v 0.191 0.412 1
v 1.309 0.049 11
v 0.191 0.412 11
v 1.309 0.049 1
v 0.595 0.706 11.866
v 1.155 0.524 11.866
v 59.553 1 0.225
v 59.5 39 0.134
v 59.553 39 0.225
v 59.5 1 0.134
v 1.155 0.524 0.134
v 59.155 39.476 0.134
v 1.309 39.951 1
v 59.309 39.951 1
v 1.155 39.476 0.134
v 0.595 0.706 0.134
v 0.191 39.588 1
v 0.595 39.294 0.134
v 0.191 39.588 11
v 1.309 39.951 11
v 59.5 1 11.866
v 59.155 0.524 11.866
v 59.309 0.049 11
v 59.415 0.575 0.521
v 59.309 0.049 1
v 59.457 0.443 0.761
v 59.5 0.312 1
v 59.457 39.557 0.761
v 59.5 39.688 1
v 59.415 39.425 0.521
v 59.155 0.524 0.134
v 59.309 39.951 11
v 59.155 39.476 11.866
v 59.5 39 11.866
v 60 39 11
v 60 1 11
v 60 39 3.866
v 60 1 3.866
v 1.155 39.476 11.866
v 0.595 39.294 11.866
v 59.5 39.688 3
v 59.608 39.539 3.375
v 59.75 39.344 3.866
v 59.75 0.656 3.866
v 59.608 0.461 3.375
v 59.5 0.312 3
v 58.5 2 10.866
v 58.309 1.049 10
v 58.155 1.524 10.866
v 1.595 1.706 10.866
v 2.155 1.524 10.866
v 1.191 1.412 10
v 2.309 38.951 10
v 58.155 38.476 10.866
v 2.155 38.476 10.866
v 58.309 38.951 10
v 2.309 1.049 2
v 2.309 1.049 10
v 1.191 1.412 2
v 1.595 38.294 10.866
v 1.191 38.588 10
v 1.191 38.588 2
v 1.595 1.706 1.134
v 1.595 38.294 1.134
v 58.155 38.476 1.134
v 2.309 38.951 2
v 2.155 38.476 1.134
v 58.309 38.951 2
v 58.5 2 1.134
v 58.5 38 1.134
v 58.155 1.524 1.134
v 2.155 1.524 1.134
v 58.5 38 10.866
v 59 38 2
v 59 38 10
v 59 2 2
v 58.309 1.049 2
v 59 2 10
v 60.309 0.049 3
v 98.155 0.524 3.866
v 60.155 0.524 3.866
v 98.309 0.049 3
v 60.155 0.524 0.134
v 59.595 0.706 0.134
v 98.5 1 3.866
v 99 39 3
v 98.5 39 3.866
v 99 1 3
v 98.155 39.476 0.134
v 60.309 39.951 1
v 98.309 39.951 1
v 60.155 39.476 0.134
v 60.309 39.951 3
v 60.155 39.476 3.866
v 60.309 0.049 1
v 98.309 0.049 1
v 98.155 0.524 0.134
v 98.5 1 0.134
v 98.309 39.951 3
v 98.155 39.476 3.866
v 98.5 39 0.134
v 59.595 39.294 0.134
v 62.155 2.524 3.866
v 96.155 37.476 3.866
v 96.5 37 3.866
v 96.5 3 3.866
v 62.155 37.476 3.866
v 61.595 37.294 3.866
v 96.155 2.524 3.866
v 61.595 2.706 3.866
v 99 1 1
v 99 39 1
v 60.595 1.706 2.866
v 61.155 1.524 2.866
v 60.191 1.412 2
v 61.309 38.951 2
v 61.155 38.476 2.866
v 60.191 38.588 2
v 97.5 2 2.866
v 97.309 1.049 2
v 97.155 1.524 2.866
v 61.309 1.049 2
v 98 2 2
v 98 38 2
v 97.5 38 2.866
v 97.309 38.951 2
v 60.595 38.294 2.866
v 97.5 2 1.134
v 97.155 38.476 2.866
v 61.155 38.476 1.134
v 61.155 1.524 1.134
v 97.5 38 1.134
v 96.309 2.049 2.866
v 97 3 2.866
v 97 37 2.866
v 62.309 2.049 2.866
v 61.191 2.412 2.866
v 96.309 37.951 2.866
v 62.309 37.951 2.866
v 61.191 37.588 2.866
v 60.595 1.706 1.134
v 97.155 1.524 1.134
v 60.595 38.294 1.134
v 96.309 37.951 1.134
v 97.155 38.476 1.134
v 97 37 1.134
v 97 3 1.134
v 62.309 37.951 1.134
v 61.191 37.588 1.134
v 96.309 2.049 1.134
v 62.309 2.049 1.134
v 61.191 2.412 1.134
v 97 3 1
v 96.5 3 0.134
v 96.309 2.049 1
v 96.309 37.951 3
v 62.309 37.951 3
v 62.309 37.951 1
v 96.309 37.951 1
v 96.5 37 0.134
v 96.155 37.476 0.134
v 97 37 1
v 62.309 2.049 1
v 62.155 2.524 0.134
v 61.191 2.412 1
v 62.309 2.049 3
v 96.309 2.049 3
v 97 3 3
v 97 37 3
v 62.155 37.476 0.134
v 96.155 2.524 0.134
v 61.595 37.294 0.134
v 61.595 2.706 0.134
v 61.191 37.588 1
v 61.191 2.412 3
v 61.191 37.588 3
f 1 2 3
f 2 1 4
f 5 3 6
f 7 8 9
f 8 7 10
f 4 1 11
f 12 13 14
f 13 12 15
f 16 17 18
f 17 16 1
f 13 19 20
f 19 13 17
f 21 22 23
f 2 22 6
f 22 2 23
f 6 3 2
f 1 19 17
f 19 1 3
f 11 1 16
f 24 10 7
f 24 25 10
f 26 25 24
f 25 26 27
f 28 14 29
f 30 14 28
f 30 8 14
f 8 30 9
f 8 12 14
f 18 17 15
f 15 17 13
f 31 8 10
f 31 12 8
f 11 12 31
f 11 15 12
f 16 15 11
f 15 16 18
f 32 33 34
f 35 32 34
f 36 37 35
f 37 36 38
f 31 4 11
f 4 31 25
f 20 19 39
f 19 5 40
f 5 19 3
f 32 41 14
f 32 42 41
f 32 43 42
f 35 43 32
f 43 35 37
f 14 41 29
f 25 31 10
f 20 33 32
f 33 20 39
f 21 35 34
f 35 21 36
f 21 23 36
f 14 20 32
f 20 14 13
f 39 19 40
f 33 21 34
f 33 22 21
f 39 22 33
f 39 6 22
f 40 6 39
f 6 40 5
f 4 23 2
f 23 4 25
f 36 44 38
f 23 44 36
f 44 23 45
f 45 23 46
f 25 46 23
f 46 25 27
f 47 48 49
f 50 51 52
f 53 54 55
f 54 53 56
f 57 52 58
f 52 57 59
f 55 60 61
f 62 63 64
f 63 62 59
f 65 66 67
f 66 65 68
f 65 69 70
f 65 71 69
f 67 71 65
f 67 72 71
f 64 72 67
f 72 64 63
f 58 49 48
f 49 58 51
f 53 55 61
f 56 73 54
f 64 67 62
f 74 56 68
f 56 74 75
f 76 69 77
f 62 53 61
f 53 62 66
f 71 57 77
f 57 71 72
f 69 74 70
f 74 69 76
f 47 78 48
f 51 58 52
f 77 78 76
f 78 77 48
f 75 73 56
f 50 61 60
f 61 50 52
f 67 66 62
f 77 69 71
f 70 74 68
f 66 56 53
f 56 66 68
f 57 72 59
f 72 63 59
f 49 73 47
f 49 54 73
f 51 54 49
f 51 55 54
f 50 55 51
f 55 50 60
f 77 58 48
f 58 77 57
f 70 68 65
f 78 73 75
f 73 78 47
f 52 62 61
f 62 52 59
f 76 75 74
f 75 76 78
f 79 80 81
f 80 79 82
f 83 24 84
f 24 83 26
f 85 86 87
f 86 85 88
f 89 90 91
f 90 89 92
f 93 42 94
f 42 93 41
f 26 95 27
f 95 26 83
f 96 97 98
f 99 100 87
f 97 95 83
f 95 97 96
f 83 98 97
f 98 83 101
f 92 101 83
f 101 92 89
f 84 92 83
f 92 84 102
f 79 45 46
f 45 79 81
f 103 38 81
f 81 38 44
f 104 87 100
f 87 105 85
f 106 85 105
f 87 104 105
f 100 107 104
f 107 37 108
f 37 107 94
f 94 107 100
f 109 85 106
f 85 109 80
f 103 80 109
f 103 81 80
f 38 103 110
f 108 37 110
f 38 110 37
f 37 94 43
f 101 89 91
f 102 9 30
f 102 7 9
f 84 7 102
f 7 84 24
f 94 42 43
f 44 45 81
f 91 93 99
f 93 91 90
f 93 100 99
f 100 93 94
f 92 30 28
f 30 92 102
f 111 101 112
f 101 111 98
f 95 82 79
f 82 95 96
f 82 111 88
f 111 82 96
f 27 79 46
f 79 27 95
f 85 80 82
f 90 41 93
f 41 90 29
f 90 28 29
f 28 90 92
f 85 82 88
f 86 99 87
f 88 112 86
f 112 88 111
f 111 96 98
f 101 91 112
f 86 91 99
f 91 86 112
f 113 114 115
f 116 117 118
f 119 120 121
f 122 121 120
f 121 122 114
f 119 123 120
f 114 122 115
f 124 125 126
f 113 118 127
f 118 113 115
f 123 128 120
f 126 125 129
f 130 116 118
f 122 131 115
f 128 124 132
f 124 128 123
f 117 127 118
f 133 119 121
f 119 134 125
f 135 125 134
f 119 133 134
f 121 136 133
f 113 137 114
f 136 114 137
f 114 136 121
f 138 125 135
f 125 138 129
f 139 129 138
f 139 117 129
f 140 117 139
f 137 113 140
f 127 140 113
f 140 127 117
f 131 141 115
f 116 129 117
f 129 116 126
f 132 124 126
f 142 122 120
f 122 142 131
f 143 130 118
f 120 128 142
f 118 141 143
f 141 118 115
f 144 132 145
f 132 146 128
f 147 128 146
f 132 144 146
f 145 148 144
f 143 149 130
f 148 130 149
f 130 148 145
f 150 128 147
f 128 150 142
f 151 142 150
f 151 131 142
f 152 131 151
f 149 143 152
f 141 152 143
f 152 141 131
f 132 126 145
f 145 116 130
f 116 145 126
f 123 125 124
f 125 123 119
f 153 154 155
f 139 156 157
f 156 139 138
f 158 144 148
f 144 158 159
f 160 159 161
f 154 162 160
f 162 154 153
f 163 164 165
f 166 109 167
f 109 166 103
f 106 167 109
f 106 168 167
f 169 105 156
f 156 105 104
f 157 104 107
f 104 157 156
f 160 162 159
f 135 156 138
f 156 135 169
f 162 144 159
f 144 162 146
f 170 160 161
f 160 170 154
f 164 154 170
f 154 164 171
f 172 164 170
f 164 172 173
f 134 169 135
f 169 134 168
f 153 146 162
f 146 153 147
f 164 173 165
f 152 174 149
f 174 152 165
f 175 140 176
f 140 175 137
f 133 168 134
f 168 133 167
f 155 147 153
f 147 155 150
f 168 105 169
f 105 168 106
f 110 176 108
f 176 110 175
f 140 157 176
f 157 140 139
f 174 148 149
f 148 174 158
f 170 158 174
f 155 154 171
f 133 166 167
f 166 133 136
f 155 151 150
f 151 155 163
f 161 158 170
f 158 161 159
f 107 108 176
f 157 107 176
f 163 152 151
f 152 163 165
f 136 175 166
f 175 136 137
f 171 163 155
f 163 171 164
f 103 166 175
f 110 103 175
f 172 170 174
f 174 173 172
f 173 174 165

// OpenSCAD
module roundedBox(height, width, length, wall_thickness, corner_radius) {
    hull() {
        translate([corner_radius, corner_radius, corner_radius])
            sphere(corner_radius);
        translate([length - corner_radius, corner_radius, corner_radius])
            sphere(corner_radius);
        translate([corner_radius, width - corner_radius, corner_radius])
            sphere(corner_radius);
        translate([length - corner_radius, width - corner_radius, corner_radius])
            sphere(corner_radius);
        translate([corner_radius, corner_radius, height - corner_radius])
            sphere(corner_radius);
        translate([length - corner_radius, corner_radius, height - corner_radius])
            sphere(corner_radius);
        translate([corner_radius, width - corner_radius, height - corner_radius])
            sphere(corner_radius);
        translate([length - corner_radius, width - corner_radius, height - corner_radius])
            sphere(corner_radius);
    }
    
    translate([wall_thickness, wall_thickness, wall_thickness])
    hull() {
        translate([corner_radius, corner_radius, corner_radius])
            sphere(corner_radius);
        translate([length - wall_thickness*2 - corner_radius, corner_radius, corner_radius])
            sphere(corner_radius);
        translate([corner_radius, width - wall_thickness*2 - corner_radius, corner_radius])
            sphere(corner_radius);
        translate([length - wall_thickness*2 - corner_radius, width - wall_thickness*2 - corner_radius, corner_radius])
            sphere(corner_radius);
        translate([corner_radius, corner_radius, height - wall_thickness*2 - corner_radius])
            sphere(corner_radius);
        translate([length - wall_thickness*2 - corner_radius, corner_radius, height - wall_thickness*2 - corner_radius])
            sphere(corner_radius);
        translate([corner_radius, width - wall_thickness*2 - corner_radius, height - wall_thickness*2 - corner_radius])
            sphere(corner_radius);
        translate([length - wall_thickness*2 - corner_radius, width - wall_thickness*2 - corner_radius, height - wall_thickness*2 - corner_radius])
            sphere(corner_radius);
    }
}

difference() {
    roundedBox(12, 40, 60, 1, 1);
    translate([1, 1, 1])
    roundedBox(10, 38, 58, 1, 1);
}

translate([59, 0, 0]) // Move the second box to avoid overlap
difference() {
    roundedBox(4, 40, 40, 1, 1);
    translate([1, 1, 1])
    roundedBox(2, 38, 38, 1, 1);
}
